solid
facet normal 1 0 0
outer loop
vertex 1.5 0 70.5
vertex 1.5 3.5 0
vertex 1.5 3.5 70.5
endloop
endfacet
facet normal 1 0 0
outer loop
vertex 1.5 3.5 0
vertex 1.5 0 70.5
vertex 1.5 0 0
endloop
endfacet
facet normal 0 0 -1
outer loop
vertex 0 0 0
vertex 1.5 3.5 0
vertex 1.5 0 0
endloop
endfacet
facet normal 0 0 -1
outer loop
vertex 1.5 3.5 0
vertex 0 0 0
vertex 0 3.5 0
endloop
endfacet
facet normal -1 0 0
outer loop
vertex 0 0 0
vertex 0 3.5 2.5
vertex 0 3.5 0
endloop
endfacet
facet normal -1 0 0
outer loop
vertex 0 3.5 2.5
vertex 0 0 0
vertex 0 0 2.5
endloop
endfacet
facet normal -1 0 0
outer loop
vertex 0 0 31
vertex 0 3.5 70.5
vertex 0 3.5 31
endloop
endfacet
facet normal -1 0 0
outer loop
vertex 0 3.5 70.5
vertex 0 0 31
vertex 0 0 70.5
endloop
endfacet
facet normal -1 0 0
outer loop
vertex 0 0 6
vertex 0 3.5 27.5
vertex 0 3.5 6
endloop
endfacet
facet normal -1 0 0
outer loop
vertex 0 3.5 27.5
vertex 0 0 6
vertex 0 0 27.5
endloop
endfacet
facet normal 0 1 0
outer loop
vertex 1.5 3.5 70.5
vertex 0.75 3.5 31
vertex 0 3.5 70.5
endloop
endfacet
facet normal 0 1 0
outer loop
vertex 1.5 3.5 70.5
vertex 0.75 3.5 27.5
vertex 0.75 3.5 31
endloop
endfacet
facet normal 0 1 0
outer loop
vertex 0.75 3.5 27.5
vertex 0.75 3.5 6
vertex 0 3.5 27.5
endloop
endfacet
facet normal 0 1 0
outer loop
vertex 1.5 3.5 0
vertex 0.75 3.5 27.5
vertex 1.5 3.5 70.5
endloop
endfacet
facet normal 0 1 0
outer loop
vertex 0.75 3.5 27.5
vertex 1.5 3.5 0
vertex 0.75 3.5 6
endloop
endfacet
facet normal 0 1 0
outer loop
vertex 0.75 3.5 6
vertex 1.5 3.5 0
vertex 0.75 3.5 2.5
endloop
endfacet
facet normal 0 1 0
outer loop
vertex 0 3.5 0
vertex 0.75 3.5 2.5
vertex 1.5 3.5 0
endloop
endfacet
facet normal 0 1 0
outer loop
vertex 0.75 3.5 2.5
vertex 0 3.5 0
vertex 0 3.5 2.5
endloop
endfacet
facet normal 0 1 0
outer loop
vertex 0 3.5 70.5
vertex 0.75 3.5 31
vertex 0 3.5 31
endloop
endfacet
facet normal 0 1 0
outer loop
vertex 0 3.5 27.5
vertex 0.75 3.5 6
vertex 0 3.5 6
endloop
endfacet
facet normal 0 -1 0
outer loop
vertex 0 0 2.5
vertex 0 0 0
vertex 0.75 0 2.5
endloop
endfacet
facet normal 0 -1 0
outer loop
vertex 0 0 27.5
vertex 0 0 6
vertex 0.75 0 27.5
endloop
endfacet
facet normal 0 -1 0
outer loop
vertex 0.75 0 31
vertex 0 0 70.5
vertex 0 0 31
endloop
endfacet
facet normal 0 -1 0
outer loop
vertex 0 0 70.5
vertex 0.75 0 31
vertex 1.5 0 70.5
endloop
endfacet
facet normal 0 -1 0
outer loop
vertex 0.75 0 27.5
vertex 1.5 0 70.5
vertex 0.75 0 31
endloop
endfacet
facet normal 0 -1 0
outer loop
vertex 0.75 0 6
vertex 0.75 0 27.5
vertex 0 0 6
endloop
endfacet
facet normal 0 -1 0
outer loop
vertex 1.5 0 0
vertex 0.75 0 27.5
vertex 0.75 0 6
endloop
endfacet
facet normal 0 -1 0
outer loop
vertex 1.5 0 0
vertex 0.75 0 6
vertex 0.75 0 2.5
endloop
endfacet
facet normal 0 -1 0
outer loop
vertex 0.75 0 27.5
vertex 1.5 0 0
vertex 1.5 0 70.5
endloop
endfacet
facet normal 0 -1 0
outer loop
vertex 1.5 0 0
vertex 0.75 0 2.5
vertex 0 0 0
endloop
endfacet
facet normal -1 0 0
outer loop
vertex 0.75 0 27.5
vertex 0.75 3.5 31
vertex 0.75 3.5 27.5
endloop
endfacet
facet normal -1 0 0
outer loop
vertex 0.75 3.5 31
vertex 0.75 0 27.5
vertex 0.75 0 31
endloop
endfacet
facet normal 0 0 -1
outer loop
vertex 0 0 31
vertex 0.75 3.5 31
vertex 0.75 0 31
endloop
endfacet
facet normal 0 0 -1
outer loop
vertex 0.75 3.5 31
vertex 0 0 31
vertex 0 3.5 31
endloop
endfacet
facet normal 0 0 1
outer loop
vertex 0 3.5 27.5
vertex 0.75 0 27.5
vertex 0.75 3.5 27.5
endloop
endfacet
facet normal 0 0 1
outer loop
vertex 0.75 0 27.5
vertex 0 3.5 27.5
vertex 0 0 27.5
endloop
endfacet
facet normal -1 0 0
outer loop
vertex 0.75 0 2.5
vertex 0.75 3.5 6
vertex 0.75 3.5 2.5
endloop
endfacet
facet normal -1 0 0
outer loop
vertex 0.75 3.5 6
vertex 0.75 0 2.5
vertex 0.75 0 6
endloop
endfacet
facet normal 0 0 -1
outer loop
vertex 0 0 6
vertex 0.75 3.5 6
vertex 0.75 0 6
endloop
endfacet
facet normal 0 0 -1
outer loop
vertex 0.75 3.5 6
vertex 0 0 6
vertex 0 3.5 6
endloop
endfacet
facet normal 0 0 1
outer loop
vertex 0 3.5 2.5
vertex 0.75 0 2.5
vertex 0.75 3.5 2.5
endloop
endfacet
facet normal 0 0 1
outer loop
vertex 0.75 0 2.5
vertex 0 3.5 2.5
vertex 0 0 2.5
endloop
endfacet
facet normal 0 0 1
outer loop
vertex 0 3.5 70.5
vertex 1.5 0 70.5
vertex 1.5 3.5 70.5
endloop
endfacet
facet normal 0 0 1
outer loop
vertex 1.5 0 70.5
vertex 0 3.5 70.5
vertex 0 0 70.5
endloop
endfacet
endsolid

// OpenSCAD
// file: ../config.scad
// height of desktop and shelves
desktop_shelf_color="Sienna";
desktop_height=31;
desktop_thickness=0.75;
table_width=96;
table_depth=36;
shelf_thickness=0.5;
shelf_height=6;
top_shelf_height=72.5;
hutch_shelf_height=50;
left_lower_shelf_height=22;
left_lower_shelf_thickness=0.25;

// Legs
front_leg_length=desktop_height;
rear_leg_length=top_shelf_height-shelf_thickness;
leg_timber_width=1.5;
leg_timber_depth=3.5;
center_leg_timber_width=1.5;
center_leg_timber_depth=3.5;
center_leg_setback=24;

// Parts Shelves
parts_shelf_thickness = 0.35;
parts_shelf_spacing = 0.15;
parts_plate_thickness = 0.2;
parts_support_depth = 0.25;
parts_shelf_depth = 11;
parts_support_height = 11;
parts_shelf_width = (table_width/4)-(center_leg_timber_width*2)-(parts_plate_thickness*2);

// Plates
strut_timber_depth=1.5;
strut_timber_height=3.5;
top_shelf_timber_depth=3.5;
top_shelf_timber_height=1.5;
// file: ../components/leg_center_NOTinner_NOTleft.scad
module leg_center_NOTinner_NOTleft()
{
    include <../config.scad>
    leg_length = rear_leg_length;
    echo(str("BOM ITEM: leg_center_NOTinner_NOTleft"));
    render() { // see note in README about rendering
        difference() {
            cube([leg_timber_width,leg_timber_depth,leg_length],false);

            // Top rabbets
            translate([0,0,desktop_height-strut_timber_height])
            {
                // rabbet cut on short side
                cube([strut_timber_depth/2,leg_timber_depth,strut_timber_height],false);
            }

            // Bottom rabbets
            translate([0,0,shelf_height-strut_timber_height])
            {
                // rabbet cut on short side
                cube([strut_timber_depth/2,leg_timber_depth,strut_timber_height],false);
            }

            // rear and center legs only
            if(top_shelf_timber_height >= top_shelf_timber_depth) {
              // Upper shelf rabbets for back/middle legs
              translate([0,0,leg_length-top_shelf_timber_height]){
                cube([top_shelf_timber_depth/2,leg_timber_depth,top_shelf_timber_height],false);
                cube([leg_timber_width,top_shelf_timber_depth/2,top_shelf_timber_height],false);
              }
            } else {
              // Upper shelf rabbets for back/middle legs
              translate([0,0,leg_length-top_shelf_timber_height]){
                cube([leg_timber_width,leg_timber_depth,top_shelf_timber_height],false);
              }
            }
        }
    }
}
// main file
use <../components/leg_center_NOTinner_NOTleft.scad>

leg_center_NOTinner_NOTleft();
